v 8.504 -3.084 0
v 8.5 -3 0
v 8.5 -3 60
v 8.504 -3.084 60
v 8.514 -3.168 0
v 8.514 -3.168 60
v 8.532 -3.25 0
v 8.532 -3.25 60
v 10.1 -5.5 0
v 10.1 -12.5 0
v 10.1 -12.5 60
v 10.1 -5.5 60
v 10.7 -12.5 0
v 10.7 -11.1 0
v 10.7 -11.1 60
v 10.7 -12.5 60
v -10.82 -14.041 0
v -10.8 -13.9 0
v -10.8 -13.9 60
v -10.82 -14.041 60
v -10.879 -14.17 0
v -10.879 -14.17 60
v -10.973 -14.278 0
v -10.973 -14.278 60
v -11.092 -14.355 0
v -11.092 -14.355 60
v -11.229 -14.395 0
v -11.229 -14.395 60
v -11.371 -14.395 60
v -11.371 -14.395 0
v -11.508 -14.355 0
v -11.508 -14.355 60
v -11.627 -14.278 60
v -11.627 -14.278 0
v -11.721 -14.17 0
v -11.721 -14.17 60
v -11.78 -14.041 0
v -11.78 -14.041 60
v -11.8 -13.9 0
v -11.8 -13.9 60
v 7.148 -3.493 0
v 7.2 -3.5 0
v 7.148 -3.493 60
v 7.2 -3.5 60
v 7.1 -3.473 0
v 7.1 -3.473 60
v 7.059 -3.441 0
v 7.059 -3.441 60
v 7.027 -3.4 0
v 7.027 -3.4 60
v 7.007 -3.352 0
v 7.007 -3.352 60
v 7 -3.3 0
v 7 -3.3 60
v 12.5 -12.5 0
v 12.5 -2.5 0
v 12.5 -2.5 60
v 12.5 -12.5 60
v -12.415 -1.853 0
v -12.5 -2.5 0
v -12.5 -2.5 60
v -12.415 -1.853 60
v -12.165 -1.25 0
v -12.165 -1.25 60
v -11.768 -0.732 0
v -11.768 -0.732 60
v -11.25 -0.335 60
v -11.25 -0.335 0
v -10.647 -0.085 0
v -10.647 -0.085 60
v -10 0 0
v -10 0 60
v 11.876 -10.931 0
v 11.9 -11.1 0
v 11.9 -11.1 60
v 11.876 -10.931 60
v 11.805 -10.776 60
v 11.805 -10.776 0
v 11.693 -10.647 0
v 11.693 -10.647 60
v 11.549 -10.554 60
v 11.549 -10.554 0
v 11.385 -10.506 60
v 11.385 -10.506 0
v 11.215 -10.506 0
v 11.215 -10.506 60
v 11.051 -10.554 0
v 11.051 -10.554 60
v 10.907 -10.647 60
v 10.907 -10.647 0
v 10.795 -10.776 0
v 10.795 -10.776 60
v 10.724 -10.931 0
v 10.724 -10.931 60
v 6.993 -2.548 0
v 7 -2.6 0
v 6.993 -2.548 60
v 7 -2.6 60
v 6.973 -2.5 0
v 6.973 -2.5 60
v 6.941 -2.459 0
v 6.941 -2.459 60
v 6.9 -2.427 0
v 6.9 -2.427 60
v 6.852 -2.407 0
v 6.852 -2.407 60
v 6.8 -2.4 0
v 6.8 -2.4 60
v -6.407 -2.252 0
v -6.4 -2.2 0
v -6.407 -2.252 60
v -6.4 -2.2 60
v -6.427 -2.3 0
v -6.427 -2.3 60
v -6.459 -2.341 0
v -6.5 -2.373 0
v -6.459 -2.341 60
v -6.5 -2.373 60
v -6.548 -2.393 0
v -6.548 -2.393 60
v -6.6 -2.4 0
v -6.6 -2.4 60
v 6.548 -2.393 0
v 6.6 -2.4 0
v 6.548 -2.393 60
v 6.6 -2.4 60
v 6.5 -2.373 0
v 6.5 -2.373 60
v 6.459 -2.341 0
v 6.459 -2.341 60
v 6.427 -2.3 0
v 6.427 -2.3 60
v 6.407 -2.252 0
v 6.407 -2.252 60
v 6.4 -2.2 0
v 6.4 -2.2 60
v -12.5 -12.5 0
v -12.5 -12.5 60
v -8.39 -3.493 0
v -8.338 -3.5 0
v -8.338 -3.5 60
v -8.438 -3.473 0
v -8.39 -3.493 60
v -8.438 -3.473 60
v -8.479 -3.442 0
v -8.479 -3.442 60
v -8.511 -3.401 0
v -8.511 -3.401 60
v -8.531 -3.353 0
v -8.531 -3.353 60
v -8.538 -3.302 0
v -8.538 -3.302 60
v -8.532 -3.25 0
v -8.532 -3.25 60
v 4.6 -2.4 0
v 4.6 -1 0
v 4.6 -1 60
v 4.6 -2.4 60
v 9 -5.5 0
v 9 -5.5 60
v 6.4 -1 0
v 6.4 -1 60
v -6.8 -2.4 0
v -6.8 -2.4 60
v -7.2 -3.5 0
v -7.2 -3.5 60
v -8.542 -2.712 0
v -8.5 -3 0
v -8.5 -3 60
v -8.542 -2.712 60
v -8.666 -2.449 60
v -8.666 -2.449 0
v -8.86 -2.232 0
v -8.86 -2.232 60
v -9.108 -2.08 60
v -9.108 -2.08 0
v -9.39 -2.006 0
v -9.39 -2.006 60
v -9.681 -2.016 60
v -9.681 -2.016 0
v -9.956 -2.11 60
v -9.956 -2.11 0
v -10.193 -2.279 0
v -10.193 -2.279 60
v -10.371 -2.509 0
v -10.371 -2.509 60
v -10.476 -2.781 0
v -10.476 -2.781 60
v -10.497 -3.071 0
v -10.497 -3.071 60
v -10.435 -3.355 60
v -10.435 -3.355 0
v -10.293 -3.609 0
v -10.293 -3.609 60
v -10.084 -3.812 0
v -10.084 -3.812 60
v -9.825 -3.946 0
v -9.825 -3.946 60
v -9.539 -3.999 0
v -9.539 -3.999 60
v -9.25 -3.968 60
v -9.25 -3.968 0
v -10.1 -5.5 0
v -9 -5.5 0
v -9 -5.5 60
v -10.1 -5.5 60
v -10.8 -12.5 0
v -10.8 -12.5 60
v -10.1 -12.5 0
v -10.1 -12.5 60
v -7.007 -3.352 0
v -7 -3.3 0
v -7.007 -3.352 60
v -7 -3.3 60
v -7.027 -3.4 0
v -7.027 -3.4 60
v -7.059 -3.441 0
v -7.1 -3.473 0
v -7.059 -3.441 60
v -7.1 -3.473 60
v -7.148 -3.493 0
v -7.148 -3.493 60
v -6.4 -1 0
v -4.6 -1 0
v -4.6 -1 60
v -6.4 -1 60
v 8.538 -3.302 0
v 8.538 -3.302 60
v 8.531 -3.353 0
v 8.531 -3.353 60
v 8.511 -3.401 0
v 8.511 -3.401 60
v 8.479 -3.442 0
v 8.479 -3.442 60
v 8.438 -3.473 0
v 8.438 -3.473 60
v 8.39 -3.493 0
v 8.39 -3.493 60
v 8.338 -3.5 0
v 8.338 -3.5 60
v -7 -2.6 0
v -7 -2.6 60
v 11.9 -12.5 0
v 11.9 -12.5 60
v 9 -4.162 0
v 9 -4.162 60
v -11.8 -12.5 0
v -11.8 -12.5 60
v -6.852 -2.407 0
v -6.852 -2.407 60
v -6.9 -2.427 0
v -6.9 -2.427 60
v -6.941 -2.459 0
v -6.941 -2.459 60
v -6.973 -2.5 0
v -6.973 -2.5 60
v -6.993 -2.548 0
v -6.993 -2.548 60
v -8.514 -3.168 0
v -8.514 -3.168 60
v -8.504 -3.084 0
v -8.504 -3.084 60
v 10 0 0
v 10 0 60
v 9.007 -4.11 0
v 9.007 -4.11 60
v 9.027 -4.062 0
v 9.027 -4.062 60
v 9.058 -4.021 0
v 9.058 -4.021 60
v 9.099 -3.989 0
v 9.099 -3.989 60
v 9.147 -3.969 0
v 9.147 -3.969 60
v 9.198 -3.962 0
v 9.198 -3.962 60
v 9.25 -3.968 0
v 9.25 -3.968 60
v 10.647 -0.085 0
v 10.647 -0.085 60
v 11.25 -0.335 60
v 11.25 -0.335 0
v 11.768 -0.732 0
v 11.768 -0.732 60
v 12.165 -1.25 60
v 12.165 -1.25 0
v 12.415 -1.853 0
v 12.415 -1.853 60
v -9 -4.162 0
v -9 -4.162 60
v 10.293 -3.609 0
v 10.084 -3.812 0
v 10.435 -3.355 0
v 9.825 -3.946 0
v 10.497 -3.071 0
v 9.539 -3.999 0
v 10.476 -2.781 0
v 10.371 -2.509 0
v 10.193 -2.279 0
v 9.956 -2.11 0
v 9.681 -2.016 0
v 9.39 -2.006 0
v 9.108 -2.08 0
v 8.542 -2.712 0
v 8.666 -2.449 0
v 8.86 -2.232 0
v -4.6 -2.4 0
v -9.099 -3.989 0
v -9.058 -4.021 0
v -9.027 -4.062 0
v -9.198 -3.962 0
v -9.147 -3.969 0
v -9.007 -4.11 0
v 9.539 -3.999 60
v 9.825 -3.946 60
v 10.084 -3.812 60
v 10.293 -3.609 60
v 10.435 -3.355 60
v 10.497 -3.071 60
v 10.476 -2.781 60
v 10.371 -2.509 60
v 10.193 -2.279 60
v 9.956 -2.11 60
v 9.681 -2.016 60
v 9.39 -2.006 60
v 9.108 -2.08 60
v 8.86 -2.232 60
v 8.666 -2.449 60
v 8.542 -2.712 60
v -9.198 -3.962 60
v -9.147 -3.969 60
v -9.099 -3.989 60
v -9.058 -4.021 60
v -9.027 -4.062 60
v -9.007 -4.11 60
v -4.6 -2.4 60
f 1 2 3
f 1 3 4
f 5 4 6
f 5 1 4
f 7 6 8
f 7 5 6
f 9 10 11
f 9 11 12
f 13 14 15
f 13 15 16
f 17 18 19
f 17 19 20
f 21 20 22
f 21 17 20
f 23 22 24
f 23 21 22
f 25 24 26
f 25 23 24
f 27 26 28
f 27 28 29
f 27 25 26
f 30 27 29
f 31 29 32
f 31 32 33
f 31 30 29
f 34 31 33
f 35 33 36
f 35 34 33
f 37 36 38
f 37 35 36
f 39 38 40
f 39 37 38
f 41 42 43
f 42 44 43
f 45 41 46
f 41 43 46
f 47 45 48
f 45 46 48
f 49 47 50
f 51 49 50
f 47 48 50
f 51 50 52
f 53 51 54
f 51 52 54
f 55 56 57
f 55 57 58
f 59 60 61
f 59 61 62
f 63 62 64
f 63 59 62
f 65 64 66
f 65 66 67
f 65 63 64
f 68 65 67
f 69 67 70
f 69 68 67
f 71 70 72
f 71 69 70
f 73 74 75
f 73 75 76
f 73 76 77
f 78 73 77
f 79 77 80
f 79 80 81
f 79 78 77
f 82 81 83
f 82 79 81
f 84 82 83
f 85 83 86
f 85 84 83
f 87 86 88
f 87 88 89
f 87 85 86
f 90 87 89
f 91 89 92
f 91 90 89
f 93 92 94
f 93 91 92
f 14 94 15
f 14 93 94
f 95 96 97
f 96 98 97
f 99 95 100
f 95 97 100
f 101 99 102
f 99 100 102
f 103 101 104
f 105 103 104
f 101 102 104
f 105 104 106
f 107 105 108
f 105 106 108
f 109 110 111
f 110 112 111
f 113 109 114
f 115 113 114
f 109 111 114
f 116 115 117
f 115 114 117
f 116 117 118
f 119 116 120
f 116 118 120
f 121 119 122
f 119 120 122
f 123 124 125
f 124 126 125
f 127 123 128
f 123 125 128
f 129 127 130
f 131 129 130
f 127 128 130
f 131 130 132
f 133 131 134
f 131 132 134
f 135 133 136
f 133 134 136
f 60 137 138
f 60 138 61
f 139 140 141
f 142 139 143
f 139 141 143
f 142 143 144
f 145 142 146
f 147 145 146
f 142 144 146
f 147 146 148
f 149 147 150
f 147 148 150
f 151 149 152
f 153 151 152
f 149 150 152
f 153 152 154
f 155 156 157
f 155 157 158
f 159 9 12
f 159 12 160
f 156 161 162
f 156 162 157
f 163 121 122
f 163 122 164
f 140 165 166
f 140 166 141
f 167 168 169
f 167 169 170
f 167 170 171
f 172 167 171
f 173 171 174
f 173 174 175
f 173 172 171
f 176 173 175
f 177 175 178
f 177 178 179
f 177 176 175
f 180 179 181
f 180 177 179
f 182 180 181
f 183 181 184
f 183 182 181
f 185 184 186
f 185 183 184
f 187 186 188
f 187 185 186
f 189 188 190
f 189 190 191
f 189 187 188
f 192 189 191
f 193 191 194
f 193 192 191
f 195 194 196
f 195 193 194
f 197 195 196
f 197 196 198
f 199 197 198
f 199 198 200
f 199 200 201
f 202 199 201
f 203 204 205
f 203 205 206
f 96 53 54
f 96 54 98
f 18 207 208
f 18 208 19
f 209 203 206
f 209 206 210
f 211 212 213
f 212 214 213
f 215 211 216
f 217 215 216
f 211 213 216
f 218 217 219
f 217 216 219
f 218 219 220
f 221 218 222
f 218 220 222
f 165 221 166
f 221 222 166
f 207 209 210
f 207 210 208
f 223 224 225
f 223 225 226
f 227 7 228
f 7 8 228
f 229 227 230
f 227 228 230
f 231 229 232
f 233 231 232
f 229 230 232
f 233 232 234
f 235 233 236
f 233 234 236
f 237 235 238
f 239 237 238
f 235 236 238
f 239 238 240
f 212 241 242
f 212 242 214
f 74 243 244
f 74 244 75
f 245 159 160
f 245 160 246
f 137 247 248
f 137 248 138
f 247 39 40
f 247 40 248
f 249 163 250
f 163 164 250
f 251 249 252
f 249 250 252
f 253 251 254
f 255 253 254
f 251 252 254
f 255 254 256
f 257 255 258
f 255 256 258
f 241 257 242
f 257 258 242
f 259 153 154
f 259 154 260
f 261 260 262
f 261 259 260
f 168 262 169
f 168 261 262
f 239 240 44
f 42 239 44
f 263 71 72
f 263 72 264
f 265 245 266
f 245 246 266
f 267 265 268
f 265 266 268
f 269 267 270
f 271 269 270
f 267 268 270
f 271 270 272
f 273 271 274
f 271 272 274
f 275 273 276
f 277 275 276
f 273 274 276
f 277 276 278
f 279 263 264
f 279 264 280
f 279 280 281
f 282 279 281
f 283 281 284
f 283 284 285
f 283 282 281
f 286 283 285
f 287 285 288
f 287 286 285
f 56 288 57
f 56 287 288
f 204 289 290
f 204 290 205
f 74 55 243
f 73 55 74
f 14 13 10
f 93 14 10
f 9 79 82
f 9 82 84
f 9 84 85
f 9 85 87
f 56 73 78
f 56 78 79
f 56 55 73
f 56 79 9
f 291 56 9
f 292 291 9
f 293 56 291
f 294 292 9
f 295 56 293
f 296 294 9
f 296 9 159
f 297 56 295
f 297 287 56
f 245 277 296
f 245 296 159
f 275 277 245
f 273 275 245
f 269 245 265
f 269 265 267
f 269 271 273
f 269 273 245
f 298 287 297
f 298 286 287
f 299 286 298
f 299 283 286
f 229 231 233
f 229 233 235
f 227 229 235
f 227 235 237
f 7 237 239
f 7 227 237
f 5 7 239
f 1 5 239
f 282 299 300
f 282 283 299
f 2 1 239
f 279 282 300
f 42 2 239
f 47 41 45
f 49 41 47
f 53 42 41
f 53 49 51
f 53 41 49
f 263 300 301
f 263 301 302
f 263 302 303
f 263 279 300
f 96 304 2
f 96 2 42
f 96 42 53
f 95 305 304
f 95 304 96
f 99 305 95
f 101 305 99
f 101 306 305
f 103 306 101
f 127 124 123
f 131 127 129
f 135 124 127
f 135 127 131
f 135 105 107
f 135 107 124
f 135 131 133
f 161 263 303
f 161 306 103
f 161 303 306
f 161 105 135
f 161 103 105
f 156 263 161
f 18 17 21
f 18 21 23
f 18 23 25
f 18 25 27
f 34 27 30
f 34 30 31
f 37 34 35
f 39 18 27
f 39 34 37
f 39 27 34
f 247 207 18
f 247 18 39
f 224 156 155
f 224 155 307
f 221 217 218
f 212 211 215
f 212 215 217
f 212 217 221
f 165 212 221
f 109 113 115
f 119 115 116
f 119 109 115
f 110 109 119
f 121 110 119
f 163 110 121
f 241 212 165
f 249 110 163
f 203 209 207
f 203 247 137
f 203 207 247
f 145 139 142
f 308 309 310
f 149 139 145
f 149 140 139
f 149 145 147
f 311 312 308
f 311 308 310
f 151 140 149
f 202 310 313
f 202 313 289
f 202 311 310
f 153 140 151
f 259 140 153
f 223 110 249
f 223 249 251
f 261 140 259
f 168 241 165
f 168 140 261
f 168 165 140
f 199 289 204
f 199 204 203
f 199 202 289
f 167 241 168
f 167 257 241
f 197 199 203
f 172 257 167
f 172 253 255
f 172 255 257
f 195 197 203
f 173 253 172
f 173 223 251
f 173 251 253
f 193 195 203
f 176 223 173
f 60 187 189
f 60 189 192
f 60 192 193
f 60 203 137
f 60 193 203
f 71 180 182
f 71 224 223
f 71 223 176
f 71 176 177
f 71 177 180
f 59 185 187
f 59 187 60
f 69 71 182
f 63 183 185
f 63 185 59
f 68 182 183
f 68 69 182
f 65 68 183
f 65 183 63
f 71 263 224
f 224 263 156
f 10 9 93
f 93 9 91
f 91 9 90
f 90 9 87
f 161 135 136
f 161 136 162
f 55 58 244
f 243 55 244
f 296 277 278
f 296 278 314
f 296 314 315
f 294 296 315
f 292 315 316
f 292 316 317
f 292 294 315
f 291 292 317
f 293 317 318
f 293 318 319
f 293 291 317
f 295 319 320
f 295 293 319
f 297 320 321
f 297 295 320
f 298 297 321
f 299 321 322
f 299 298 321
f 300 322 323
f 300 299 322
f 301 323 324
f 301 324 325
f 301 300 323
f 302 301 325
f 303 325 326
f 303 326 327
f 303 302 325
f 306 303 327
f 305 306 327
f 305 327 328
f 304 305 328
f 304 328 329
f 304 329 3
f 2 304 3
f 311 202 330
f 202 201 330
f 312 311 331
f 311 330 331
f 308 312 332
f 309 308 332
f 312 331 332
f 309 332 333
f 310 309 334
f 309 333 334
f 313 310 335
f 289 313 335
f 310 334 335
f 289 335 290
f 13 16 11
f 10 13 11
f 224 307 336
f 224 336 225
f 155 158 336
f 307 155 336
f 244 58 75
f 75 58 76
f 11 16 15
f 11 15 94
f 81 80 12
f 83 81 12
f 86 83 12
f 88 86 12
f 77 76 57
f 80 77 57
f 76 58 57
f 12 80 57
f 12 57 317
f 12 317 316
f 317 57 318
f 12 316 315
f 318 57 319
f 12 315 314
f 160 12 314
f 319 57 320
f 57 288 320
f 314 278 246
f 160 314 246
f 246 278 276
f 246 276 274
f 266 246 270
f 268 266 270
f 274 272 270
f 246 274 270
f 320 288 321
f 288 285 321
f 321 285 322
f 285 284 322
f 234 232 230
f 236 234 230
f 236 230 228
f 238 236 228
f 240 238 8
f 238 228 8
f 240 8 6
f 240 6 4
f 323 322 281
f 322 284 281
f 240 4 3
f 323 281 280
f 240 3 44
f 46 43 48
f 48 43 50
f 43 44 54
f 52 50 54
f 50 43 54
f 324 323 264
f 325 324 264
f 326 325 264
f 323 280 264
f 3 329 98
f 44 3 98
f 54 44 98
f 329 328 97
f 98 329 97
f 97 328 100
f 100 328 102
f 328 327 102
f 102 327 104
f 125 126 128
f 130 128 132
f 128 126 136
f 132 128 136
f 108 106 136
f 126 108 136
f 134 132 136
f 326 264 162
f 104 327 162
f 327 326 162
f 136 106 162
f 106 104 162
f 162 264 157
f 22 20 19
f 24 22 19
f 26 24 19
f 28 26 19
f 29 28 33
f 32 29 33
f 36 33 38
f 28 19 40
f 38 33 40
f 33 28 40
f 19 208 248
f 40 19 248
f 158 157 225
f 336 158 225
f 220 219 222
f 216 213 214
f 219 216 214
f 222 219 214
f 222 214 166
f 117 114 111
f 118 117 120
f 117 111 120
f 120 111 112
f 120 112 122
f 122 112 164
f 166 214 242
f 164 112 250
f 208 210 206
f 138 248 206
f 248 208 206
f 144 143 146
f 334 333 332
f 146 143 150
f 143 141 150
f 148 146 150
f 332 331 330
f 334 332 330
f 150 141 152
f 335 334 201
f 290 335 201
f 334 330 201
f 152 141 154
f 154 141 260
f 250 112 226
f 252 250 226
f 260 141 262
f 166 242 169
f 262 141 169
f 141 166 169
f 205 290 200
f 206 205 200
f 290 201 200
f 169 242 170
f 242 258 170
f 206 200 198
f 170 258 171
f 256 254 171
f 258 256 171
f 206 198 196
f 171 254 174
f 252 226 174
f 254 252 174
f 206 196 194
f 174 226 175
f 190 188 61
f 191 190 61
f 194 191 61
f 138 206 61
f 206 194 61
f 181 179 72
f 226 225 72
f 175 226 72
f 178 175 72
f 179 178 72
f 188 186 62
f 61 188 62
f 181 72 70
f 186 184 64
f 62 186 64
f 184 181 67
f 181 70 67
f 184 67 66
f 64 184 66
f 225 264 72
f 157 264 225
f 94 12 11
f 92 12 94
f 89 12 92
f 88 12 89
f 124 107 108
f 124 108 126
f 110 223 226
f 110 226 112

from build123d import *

# Parameters (mm, degrees)
EXTRUDE_1_DEPTH = 60
FILLET_1_R      = 0.2


with BuildPart() as part:
    # 草图1 → 凸台-拉伸1 (new body)
    with BuildSketch(Plane.XY):
        with BuildLine():
            Line((-10, 0), (10, 0))
            ThreePointArc((10, 0), (11.767766953, -0.732233047), (12.5, -2.5))
            Line((12.5, -2.5), (12.5, -12.5))
            Line((12.5, -12.5), (11.9, -12.5))
            Line((11.9, -12.5), (11.9, -11.1))
            ThreePointArc((11.9, -11.1), (11.3, -10.5), (10.7, -11.1))
            Line((10.7, -11.1), (10.7, -12.5))
            Line((10.7, -12.5), (10.1, -12.5))
            Line((10.1, -12.5), (10.1, -5.5))
            Line((10.1, -5.5), (9, -5.5))
            Line((9, -5.5), (9, -3.866025404))
            ThreePointArc((9, -3.866025404), (10.366025404, -2.5), (8.5, -3))
            ThreePointArc((8.5, -3), (8.534074174, -3.258819045), (8.633974596, -3.5))
            Line((8.633974596, -3.5), (7, -3.5))
            Line((7, -3.5), (7, -2.4))
            Line((7, -2.4), (6.4, -2.4))
            Line((6.4, -2.4), (6.4, -1))
            Line((6.4, -1), (4.6, -1))
            Line((4.6, -1), (4.6, -2.4))
            Line((4.6, -2.4), (-4.6, -2.4))
            Line((-4.6, -2.4), (-4.6, -1))
            Line((-4.6, -1), (-6.4, -1))
            Line((-6.4, -1), (-6.4, -2.4))
            Line((-6.4, -2.4), (-7, -2.4))
            Line((-7, -2.4), (-7, -3.5))
            Line((-7, -3.5), (-8.633974596, -3.5))
            ThreePointArc((-8.633974596, -3.5), (-8.534074174, -3.258819045), (-8.5, -3))
            ThreePointArc((-8.5, -3), (-10.366025404, -2.5), (-9, -3.866025404))
            Line((-9, -3.866025404), (-9, -5.5))
            Line((-9, -5.5), (-10.1, -5.5))
            Line((-10.1, -5.5), (-10.1, -12.5))
            Line((-10.1, -12.5), (-10.8, -12.5))
            Line((-10.8, -12.5), (-10.8, -13.9))
            ThreePointArc((-10.8, -13.9), (-11.3, -14.4), (-11.8, -13.9))
            Line((-11.8, -13.9), (-11.8, -12.5))
            Line((-11.8, -12.5), (-12.5, -12.5))
            Line((-12.5, -12.5), (-12.5, -2.5))
            ThreePointArc((-12.5, -2.5), (-11.767766953, -0.732233047), (-10, 0))
        make_face()
    extrude(amount=EXTRUDE_1_DEPTH)

    # 圆角1
    fillet_1_edges = [part.edges().sort_by_distance(p)[0] for p in [
        (9, -3.866025404, 30),
        (8.633974596, -3.5, 30),
        (7, -3.5, 30),
        (7, -2.4, 30),
        (6.4, -2.4, 30),
        (-6.4, -2.4, 30),
        (-7, -2.4, 30),
        (-7, -3.5, 30),
        (-8.633974596, -3.5, 30),
        (-9, -3.866025404, 30),
    ]]
    fillet(fillet_1_edges, radius=FILLET_1_R)


solid = part.part
